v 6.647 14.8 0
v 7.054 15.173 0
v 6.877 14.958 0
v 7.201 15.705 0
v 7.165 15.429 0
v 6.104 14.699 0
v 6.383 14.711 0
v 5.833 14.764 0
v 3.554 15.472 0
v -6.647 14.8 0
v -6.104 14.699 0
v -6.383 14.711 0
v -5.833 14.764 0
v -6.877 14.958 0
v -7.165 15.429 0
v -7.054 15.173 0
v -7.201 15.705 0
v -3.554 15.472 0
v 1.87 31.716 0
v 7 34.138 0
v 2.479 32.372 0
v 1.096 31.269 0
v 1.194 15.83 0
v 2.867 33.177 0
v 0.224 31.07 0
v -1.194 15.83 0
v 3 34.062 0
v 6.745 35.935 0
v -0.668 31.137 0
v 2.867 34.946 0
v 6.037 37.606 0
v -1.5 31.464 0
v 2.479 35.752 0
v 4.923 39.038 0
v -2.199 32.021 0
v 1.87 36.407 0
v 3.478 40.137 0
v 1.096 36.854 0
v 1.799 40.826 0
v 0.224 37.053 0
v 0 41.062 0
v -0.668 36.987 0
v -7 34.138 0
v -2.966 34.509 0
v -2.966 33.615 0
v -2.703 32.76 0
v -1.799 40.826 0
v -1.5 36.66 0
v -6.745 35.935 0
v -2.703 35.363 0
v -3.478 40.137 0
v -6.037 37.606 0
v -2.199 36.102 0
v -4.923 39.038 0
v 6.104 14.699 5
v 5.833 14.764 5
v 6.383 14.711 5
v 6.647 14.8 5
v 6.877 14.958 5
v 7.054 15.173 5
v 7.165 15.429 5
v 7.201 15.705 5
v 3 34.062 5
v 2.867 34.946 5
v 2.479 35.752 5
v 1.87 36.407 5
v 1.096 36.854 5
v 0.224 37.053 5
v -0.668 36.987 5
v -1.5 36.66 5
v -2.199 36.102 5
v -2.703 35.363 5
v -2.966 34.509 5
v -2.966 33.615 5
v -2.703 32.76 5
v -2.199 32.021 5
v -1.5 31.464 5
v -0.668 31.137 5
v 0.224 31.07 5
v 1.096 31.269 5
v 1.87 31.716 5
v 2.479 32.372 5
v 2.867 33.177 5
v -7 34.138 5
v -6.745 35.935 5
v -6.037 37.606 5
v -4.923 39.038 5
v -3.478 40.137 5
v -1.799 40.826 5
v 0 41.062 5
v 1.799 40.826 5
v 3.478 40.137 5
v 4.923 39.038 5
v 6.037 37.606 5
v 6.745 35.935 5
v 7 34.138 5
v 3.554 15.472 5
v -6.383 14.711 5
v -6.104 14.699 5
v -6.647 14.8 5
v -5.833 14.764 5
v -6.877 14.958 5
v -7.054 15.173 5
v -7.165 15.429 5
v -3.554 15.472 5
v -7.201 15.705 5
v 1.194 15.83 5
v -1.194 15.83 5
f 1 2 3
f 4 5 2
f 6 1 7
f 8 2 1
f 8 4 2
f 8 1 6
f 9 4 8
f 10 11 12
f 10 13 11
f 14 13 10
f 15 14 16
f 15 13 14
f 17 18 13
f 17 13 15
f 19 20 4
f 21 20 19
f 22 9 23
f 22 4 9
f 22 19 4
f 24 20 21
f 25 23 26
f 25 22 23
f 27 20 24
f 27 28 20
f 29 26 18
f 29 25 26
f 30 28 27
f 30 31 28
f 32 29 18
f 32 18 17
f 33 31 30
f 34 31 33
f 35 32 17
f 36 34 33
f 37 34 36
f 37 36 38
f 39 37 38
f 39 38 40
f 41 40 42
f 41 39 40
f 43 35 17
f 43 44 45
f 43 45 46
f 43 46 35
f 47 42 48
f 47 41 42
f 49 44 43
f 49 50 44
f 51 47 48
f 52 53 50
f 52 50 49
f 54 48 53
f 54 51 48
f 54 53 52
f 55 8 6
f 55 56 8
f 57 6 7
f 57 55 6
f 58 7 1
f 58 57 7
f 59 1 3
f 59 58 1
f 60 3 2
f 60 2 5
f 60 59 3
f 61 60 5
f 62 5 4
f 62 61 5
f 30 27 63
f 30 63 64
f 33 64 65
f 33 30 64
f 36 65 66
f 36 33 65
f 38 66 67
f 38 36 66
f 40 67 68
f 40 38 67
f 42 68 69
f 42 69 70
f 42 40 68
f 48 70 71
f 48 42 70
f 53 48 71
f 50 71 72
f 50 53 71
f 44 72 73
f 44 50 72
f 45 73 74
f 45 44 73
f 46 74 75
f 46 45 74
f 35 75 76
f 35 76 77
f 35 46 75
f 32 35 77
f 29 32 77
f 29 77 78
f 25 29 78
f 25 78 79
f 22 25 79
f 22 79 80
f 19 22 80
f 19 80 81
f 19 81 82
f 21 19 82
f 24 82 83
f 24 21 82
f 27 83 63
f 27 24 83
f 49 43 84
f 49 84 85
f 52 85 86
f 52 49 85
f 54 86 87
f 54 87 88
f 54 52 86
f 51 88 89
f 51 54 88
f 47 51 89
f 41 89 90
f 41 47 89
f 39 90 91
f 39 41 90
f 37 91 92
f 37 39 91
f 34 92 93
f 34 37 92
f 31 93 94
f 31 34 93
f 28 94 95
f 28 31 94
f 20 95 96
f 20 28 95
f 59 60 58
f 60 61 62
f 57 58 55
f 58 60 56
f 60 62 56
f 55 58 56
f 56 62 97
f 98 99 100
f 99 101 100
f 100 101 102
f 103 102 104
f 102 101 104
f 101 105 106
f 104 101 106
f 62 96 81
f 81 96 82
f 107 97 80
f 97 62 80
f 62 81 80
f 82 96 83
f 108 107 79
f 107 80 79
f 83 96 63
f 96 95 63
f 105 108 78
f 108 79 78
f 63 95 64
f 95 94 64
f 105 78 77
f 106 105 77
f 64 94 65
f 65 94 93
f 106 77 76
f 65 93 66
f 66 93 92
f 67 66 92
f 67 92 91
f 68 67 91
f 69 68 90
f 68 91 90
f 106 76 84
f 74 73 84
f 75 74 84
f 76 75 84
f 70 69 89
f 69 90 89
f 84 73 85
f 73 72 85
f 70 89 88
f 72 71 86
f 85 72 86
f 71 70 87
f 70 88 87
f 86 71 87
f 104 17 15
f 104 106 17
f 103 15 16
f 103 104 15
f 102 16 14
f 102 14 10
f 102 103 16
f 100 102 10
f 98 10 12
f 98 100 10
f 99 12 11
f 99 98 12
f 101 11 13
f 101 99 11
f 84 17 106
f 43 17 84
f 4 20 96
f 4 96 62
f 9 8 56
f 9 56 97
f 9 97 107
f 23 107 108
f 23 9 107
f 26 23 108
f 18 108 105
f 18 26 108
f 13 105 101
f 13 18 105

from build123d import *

# Parameters (mm, degrees)
SKETCH1_R           = 3
BOSS_EXTRUDE1_DEPTH = 5
FILLET1_R           = 1


with BuildPart() as part:
    # Sketch1 → Boss-Extrude1 (new body)
    with BuildSketch(Plane.XY):
        with BuildLine():
            Line((-7.217785759, 14.139278402), (-6.99958338, 34.13808806))
            ThreePointArc((-6.99958338, 34.13808806), (0, 41.061717228), (6.99958338, 34.13808806))
            Line((6.99958338, 34.13808806), (7.217785759, 14.139278402))
            ThreePointArc((7.217785759, 14.139278402), (0, 15.875), (-7.217785759, 14.139278402))
        make_face()
        with Locations((0, 34.061717228)):
            Circle(SKETCH1_R, mode=Mode.SUBTRACT)
    extrude(amount=BOSS_EXTRUDE1_DEPTH)

    # Fillet1
    fillet1_edges = [part.edges().sort_by_distance(p)[0] for p in [
        (-7.217785759, 14.139278402, 2.5),
        (7.217785759, 14.139278402, 2.5),
    ]]
    fillet(fillet1_edges, radius=FILLET1_R)


solid = part.part
